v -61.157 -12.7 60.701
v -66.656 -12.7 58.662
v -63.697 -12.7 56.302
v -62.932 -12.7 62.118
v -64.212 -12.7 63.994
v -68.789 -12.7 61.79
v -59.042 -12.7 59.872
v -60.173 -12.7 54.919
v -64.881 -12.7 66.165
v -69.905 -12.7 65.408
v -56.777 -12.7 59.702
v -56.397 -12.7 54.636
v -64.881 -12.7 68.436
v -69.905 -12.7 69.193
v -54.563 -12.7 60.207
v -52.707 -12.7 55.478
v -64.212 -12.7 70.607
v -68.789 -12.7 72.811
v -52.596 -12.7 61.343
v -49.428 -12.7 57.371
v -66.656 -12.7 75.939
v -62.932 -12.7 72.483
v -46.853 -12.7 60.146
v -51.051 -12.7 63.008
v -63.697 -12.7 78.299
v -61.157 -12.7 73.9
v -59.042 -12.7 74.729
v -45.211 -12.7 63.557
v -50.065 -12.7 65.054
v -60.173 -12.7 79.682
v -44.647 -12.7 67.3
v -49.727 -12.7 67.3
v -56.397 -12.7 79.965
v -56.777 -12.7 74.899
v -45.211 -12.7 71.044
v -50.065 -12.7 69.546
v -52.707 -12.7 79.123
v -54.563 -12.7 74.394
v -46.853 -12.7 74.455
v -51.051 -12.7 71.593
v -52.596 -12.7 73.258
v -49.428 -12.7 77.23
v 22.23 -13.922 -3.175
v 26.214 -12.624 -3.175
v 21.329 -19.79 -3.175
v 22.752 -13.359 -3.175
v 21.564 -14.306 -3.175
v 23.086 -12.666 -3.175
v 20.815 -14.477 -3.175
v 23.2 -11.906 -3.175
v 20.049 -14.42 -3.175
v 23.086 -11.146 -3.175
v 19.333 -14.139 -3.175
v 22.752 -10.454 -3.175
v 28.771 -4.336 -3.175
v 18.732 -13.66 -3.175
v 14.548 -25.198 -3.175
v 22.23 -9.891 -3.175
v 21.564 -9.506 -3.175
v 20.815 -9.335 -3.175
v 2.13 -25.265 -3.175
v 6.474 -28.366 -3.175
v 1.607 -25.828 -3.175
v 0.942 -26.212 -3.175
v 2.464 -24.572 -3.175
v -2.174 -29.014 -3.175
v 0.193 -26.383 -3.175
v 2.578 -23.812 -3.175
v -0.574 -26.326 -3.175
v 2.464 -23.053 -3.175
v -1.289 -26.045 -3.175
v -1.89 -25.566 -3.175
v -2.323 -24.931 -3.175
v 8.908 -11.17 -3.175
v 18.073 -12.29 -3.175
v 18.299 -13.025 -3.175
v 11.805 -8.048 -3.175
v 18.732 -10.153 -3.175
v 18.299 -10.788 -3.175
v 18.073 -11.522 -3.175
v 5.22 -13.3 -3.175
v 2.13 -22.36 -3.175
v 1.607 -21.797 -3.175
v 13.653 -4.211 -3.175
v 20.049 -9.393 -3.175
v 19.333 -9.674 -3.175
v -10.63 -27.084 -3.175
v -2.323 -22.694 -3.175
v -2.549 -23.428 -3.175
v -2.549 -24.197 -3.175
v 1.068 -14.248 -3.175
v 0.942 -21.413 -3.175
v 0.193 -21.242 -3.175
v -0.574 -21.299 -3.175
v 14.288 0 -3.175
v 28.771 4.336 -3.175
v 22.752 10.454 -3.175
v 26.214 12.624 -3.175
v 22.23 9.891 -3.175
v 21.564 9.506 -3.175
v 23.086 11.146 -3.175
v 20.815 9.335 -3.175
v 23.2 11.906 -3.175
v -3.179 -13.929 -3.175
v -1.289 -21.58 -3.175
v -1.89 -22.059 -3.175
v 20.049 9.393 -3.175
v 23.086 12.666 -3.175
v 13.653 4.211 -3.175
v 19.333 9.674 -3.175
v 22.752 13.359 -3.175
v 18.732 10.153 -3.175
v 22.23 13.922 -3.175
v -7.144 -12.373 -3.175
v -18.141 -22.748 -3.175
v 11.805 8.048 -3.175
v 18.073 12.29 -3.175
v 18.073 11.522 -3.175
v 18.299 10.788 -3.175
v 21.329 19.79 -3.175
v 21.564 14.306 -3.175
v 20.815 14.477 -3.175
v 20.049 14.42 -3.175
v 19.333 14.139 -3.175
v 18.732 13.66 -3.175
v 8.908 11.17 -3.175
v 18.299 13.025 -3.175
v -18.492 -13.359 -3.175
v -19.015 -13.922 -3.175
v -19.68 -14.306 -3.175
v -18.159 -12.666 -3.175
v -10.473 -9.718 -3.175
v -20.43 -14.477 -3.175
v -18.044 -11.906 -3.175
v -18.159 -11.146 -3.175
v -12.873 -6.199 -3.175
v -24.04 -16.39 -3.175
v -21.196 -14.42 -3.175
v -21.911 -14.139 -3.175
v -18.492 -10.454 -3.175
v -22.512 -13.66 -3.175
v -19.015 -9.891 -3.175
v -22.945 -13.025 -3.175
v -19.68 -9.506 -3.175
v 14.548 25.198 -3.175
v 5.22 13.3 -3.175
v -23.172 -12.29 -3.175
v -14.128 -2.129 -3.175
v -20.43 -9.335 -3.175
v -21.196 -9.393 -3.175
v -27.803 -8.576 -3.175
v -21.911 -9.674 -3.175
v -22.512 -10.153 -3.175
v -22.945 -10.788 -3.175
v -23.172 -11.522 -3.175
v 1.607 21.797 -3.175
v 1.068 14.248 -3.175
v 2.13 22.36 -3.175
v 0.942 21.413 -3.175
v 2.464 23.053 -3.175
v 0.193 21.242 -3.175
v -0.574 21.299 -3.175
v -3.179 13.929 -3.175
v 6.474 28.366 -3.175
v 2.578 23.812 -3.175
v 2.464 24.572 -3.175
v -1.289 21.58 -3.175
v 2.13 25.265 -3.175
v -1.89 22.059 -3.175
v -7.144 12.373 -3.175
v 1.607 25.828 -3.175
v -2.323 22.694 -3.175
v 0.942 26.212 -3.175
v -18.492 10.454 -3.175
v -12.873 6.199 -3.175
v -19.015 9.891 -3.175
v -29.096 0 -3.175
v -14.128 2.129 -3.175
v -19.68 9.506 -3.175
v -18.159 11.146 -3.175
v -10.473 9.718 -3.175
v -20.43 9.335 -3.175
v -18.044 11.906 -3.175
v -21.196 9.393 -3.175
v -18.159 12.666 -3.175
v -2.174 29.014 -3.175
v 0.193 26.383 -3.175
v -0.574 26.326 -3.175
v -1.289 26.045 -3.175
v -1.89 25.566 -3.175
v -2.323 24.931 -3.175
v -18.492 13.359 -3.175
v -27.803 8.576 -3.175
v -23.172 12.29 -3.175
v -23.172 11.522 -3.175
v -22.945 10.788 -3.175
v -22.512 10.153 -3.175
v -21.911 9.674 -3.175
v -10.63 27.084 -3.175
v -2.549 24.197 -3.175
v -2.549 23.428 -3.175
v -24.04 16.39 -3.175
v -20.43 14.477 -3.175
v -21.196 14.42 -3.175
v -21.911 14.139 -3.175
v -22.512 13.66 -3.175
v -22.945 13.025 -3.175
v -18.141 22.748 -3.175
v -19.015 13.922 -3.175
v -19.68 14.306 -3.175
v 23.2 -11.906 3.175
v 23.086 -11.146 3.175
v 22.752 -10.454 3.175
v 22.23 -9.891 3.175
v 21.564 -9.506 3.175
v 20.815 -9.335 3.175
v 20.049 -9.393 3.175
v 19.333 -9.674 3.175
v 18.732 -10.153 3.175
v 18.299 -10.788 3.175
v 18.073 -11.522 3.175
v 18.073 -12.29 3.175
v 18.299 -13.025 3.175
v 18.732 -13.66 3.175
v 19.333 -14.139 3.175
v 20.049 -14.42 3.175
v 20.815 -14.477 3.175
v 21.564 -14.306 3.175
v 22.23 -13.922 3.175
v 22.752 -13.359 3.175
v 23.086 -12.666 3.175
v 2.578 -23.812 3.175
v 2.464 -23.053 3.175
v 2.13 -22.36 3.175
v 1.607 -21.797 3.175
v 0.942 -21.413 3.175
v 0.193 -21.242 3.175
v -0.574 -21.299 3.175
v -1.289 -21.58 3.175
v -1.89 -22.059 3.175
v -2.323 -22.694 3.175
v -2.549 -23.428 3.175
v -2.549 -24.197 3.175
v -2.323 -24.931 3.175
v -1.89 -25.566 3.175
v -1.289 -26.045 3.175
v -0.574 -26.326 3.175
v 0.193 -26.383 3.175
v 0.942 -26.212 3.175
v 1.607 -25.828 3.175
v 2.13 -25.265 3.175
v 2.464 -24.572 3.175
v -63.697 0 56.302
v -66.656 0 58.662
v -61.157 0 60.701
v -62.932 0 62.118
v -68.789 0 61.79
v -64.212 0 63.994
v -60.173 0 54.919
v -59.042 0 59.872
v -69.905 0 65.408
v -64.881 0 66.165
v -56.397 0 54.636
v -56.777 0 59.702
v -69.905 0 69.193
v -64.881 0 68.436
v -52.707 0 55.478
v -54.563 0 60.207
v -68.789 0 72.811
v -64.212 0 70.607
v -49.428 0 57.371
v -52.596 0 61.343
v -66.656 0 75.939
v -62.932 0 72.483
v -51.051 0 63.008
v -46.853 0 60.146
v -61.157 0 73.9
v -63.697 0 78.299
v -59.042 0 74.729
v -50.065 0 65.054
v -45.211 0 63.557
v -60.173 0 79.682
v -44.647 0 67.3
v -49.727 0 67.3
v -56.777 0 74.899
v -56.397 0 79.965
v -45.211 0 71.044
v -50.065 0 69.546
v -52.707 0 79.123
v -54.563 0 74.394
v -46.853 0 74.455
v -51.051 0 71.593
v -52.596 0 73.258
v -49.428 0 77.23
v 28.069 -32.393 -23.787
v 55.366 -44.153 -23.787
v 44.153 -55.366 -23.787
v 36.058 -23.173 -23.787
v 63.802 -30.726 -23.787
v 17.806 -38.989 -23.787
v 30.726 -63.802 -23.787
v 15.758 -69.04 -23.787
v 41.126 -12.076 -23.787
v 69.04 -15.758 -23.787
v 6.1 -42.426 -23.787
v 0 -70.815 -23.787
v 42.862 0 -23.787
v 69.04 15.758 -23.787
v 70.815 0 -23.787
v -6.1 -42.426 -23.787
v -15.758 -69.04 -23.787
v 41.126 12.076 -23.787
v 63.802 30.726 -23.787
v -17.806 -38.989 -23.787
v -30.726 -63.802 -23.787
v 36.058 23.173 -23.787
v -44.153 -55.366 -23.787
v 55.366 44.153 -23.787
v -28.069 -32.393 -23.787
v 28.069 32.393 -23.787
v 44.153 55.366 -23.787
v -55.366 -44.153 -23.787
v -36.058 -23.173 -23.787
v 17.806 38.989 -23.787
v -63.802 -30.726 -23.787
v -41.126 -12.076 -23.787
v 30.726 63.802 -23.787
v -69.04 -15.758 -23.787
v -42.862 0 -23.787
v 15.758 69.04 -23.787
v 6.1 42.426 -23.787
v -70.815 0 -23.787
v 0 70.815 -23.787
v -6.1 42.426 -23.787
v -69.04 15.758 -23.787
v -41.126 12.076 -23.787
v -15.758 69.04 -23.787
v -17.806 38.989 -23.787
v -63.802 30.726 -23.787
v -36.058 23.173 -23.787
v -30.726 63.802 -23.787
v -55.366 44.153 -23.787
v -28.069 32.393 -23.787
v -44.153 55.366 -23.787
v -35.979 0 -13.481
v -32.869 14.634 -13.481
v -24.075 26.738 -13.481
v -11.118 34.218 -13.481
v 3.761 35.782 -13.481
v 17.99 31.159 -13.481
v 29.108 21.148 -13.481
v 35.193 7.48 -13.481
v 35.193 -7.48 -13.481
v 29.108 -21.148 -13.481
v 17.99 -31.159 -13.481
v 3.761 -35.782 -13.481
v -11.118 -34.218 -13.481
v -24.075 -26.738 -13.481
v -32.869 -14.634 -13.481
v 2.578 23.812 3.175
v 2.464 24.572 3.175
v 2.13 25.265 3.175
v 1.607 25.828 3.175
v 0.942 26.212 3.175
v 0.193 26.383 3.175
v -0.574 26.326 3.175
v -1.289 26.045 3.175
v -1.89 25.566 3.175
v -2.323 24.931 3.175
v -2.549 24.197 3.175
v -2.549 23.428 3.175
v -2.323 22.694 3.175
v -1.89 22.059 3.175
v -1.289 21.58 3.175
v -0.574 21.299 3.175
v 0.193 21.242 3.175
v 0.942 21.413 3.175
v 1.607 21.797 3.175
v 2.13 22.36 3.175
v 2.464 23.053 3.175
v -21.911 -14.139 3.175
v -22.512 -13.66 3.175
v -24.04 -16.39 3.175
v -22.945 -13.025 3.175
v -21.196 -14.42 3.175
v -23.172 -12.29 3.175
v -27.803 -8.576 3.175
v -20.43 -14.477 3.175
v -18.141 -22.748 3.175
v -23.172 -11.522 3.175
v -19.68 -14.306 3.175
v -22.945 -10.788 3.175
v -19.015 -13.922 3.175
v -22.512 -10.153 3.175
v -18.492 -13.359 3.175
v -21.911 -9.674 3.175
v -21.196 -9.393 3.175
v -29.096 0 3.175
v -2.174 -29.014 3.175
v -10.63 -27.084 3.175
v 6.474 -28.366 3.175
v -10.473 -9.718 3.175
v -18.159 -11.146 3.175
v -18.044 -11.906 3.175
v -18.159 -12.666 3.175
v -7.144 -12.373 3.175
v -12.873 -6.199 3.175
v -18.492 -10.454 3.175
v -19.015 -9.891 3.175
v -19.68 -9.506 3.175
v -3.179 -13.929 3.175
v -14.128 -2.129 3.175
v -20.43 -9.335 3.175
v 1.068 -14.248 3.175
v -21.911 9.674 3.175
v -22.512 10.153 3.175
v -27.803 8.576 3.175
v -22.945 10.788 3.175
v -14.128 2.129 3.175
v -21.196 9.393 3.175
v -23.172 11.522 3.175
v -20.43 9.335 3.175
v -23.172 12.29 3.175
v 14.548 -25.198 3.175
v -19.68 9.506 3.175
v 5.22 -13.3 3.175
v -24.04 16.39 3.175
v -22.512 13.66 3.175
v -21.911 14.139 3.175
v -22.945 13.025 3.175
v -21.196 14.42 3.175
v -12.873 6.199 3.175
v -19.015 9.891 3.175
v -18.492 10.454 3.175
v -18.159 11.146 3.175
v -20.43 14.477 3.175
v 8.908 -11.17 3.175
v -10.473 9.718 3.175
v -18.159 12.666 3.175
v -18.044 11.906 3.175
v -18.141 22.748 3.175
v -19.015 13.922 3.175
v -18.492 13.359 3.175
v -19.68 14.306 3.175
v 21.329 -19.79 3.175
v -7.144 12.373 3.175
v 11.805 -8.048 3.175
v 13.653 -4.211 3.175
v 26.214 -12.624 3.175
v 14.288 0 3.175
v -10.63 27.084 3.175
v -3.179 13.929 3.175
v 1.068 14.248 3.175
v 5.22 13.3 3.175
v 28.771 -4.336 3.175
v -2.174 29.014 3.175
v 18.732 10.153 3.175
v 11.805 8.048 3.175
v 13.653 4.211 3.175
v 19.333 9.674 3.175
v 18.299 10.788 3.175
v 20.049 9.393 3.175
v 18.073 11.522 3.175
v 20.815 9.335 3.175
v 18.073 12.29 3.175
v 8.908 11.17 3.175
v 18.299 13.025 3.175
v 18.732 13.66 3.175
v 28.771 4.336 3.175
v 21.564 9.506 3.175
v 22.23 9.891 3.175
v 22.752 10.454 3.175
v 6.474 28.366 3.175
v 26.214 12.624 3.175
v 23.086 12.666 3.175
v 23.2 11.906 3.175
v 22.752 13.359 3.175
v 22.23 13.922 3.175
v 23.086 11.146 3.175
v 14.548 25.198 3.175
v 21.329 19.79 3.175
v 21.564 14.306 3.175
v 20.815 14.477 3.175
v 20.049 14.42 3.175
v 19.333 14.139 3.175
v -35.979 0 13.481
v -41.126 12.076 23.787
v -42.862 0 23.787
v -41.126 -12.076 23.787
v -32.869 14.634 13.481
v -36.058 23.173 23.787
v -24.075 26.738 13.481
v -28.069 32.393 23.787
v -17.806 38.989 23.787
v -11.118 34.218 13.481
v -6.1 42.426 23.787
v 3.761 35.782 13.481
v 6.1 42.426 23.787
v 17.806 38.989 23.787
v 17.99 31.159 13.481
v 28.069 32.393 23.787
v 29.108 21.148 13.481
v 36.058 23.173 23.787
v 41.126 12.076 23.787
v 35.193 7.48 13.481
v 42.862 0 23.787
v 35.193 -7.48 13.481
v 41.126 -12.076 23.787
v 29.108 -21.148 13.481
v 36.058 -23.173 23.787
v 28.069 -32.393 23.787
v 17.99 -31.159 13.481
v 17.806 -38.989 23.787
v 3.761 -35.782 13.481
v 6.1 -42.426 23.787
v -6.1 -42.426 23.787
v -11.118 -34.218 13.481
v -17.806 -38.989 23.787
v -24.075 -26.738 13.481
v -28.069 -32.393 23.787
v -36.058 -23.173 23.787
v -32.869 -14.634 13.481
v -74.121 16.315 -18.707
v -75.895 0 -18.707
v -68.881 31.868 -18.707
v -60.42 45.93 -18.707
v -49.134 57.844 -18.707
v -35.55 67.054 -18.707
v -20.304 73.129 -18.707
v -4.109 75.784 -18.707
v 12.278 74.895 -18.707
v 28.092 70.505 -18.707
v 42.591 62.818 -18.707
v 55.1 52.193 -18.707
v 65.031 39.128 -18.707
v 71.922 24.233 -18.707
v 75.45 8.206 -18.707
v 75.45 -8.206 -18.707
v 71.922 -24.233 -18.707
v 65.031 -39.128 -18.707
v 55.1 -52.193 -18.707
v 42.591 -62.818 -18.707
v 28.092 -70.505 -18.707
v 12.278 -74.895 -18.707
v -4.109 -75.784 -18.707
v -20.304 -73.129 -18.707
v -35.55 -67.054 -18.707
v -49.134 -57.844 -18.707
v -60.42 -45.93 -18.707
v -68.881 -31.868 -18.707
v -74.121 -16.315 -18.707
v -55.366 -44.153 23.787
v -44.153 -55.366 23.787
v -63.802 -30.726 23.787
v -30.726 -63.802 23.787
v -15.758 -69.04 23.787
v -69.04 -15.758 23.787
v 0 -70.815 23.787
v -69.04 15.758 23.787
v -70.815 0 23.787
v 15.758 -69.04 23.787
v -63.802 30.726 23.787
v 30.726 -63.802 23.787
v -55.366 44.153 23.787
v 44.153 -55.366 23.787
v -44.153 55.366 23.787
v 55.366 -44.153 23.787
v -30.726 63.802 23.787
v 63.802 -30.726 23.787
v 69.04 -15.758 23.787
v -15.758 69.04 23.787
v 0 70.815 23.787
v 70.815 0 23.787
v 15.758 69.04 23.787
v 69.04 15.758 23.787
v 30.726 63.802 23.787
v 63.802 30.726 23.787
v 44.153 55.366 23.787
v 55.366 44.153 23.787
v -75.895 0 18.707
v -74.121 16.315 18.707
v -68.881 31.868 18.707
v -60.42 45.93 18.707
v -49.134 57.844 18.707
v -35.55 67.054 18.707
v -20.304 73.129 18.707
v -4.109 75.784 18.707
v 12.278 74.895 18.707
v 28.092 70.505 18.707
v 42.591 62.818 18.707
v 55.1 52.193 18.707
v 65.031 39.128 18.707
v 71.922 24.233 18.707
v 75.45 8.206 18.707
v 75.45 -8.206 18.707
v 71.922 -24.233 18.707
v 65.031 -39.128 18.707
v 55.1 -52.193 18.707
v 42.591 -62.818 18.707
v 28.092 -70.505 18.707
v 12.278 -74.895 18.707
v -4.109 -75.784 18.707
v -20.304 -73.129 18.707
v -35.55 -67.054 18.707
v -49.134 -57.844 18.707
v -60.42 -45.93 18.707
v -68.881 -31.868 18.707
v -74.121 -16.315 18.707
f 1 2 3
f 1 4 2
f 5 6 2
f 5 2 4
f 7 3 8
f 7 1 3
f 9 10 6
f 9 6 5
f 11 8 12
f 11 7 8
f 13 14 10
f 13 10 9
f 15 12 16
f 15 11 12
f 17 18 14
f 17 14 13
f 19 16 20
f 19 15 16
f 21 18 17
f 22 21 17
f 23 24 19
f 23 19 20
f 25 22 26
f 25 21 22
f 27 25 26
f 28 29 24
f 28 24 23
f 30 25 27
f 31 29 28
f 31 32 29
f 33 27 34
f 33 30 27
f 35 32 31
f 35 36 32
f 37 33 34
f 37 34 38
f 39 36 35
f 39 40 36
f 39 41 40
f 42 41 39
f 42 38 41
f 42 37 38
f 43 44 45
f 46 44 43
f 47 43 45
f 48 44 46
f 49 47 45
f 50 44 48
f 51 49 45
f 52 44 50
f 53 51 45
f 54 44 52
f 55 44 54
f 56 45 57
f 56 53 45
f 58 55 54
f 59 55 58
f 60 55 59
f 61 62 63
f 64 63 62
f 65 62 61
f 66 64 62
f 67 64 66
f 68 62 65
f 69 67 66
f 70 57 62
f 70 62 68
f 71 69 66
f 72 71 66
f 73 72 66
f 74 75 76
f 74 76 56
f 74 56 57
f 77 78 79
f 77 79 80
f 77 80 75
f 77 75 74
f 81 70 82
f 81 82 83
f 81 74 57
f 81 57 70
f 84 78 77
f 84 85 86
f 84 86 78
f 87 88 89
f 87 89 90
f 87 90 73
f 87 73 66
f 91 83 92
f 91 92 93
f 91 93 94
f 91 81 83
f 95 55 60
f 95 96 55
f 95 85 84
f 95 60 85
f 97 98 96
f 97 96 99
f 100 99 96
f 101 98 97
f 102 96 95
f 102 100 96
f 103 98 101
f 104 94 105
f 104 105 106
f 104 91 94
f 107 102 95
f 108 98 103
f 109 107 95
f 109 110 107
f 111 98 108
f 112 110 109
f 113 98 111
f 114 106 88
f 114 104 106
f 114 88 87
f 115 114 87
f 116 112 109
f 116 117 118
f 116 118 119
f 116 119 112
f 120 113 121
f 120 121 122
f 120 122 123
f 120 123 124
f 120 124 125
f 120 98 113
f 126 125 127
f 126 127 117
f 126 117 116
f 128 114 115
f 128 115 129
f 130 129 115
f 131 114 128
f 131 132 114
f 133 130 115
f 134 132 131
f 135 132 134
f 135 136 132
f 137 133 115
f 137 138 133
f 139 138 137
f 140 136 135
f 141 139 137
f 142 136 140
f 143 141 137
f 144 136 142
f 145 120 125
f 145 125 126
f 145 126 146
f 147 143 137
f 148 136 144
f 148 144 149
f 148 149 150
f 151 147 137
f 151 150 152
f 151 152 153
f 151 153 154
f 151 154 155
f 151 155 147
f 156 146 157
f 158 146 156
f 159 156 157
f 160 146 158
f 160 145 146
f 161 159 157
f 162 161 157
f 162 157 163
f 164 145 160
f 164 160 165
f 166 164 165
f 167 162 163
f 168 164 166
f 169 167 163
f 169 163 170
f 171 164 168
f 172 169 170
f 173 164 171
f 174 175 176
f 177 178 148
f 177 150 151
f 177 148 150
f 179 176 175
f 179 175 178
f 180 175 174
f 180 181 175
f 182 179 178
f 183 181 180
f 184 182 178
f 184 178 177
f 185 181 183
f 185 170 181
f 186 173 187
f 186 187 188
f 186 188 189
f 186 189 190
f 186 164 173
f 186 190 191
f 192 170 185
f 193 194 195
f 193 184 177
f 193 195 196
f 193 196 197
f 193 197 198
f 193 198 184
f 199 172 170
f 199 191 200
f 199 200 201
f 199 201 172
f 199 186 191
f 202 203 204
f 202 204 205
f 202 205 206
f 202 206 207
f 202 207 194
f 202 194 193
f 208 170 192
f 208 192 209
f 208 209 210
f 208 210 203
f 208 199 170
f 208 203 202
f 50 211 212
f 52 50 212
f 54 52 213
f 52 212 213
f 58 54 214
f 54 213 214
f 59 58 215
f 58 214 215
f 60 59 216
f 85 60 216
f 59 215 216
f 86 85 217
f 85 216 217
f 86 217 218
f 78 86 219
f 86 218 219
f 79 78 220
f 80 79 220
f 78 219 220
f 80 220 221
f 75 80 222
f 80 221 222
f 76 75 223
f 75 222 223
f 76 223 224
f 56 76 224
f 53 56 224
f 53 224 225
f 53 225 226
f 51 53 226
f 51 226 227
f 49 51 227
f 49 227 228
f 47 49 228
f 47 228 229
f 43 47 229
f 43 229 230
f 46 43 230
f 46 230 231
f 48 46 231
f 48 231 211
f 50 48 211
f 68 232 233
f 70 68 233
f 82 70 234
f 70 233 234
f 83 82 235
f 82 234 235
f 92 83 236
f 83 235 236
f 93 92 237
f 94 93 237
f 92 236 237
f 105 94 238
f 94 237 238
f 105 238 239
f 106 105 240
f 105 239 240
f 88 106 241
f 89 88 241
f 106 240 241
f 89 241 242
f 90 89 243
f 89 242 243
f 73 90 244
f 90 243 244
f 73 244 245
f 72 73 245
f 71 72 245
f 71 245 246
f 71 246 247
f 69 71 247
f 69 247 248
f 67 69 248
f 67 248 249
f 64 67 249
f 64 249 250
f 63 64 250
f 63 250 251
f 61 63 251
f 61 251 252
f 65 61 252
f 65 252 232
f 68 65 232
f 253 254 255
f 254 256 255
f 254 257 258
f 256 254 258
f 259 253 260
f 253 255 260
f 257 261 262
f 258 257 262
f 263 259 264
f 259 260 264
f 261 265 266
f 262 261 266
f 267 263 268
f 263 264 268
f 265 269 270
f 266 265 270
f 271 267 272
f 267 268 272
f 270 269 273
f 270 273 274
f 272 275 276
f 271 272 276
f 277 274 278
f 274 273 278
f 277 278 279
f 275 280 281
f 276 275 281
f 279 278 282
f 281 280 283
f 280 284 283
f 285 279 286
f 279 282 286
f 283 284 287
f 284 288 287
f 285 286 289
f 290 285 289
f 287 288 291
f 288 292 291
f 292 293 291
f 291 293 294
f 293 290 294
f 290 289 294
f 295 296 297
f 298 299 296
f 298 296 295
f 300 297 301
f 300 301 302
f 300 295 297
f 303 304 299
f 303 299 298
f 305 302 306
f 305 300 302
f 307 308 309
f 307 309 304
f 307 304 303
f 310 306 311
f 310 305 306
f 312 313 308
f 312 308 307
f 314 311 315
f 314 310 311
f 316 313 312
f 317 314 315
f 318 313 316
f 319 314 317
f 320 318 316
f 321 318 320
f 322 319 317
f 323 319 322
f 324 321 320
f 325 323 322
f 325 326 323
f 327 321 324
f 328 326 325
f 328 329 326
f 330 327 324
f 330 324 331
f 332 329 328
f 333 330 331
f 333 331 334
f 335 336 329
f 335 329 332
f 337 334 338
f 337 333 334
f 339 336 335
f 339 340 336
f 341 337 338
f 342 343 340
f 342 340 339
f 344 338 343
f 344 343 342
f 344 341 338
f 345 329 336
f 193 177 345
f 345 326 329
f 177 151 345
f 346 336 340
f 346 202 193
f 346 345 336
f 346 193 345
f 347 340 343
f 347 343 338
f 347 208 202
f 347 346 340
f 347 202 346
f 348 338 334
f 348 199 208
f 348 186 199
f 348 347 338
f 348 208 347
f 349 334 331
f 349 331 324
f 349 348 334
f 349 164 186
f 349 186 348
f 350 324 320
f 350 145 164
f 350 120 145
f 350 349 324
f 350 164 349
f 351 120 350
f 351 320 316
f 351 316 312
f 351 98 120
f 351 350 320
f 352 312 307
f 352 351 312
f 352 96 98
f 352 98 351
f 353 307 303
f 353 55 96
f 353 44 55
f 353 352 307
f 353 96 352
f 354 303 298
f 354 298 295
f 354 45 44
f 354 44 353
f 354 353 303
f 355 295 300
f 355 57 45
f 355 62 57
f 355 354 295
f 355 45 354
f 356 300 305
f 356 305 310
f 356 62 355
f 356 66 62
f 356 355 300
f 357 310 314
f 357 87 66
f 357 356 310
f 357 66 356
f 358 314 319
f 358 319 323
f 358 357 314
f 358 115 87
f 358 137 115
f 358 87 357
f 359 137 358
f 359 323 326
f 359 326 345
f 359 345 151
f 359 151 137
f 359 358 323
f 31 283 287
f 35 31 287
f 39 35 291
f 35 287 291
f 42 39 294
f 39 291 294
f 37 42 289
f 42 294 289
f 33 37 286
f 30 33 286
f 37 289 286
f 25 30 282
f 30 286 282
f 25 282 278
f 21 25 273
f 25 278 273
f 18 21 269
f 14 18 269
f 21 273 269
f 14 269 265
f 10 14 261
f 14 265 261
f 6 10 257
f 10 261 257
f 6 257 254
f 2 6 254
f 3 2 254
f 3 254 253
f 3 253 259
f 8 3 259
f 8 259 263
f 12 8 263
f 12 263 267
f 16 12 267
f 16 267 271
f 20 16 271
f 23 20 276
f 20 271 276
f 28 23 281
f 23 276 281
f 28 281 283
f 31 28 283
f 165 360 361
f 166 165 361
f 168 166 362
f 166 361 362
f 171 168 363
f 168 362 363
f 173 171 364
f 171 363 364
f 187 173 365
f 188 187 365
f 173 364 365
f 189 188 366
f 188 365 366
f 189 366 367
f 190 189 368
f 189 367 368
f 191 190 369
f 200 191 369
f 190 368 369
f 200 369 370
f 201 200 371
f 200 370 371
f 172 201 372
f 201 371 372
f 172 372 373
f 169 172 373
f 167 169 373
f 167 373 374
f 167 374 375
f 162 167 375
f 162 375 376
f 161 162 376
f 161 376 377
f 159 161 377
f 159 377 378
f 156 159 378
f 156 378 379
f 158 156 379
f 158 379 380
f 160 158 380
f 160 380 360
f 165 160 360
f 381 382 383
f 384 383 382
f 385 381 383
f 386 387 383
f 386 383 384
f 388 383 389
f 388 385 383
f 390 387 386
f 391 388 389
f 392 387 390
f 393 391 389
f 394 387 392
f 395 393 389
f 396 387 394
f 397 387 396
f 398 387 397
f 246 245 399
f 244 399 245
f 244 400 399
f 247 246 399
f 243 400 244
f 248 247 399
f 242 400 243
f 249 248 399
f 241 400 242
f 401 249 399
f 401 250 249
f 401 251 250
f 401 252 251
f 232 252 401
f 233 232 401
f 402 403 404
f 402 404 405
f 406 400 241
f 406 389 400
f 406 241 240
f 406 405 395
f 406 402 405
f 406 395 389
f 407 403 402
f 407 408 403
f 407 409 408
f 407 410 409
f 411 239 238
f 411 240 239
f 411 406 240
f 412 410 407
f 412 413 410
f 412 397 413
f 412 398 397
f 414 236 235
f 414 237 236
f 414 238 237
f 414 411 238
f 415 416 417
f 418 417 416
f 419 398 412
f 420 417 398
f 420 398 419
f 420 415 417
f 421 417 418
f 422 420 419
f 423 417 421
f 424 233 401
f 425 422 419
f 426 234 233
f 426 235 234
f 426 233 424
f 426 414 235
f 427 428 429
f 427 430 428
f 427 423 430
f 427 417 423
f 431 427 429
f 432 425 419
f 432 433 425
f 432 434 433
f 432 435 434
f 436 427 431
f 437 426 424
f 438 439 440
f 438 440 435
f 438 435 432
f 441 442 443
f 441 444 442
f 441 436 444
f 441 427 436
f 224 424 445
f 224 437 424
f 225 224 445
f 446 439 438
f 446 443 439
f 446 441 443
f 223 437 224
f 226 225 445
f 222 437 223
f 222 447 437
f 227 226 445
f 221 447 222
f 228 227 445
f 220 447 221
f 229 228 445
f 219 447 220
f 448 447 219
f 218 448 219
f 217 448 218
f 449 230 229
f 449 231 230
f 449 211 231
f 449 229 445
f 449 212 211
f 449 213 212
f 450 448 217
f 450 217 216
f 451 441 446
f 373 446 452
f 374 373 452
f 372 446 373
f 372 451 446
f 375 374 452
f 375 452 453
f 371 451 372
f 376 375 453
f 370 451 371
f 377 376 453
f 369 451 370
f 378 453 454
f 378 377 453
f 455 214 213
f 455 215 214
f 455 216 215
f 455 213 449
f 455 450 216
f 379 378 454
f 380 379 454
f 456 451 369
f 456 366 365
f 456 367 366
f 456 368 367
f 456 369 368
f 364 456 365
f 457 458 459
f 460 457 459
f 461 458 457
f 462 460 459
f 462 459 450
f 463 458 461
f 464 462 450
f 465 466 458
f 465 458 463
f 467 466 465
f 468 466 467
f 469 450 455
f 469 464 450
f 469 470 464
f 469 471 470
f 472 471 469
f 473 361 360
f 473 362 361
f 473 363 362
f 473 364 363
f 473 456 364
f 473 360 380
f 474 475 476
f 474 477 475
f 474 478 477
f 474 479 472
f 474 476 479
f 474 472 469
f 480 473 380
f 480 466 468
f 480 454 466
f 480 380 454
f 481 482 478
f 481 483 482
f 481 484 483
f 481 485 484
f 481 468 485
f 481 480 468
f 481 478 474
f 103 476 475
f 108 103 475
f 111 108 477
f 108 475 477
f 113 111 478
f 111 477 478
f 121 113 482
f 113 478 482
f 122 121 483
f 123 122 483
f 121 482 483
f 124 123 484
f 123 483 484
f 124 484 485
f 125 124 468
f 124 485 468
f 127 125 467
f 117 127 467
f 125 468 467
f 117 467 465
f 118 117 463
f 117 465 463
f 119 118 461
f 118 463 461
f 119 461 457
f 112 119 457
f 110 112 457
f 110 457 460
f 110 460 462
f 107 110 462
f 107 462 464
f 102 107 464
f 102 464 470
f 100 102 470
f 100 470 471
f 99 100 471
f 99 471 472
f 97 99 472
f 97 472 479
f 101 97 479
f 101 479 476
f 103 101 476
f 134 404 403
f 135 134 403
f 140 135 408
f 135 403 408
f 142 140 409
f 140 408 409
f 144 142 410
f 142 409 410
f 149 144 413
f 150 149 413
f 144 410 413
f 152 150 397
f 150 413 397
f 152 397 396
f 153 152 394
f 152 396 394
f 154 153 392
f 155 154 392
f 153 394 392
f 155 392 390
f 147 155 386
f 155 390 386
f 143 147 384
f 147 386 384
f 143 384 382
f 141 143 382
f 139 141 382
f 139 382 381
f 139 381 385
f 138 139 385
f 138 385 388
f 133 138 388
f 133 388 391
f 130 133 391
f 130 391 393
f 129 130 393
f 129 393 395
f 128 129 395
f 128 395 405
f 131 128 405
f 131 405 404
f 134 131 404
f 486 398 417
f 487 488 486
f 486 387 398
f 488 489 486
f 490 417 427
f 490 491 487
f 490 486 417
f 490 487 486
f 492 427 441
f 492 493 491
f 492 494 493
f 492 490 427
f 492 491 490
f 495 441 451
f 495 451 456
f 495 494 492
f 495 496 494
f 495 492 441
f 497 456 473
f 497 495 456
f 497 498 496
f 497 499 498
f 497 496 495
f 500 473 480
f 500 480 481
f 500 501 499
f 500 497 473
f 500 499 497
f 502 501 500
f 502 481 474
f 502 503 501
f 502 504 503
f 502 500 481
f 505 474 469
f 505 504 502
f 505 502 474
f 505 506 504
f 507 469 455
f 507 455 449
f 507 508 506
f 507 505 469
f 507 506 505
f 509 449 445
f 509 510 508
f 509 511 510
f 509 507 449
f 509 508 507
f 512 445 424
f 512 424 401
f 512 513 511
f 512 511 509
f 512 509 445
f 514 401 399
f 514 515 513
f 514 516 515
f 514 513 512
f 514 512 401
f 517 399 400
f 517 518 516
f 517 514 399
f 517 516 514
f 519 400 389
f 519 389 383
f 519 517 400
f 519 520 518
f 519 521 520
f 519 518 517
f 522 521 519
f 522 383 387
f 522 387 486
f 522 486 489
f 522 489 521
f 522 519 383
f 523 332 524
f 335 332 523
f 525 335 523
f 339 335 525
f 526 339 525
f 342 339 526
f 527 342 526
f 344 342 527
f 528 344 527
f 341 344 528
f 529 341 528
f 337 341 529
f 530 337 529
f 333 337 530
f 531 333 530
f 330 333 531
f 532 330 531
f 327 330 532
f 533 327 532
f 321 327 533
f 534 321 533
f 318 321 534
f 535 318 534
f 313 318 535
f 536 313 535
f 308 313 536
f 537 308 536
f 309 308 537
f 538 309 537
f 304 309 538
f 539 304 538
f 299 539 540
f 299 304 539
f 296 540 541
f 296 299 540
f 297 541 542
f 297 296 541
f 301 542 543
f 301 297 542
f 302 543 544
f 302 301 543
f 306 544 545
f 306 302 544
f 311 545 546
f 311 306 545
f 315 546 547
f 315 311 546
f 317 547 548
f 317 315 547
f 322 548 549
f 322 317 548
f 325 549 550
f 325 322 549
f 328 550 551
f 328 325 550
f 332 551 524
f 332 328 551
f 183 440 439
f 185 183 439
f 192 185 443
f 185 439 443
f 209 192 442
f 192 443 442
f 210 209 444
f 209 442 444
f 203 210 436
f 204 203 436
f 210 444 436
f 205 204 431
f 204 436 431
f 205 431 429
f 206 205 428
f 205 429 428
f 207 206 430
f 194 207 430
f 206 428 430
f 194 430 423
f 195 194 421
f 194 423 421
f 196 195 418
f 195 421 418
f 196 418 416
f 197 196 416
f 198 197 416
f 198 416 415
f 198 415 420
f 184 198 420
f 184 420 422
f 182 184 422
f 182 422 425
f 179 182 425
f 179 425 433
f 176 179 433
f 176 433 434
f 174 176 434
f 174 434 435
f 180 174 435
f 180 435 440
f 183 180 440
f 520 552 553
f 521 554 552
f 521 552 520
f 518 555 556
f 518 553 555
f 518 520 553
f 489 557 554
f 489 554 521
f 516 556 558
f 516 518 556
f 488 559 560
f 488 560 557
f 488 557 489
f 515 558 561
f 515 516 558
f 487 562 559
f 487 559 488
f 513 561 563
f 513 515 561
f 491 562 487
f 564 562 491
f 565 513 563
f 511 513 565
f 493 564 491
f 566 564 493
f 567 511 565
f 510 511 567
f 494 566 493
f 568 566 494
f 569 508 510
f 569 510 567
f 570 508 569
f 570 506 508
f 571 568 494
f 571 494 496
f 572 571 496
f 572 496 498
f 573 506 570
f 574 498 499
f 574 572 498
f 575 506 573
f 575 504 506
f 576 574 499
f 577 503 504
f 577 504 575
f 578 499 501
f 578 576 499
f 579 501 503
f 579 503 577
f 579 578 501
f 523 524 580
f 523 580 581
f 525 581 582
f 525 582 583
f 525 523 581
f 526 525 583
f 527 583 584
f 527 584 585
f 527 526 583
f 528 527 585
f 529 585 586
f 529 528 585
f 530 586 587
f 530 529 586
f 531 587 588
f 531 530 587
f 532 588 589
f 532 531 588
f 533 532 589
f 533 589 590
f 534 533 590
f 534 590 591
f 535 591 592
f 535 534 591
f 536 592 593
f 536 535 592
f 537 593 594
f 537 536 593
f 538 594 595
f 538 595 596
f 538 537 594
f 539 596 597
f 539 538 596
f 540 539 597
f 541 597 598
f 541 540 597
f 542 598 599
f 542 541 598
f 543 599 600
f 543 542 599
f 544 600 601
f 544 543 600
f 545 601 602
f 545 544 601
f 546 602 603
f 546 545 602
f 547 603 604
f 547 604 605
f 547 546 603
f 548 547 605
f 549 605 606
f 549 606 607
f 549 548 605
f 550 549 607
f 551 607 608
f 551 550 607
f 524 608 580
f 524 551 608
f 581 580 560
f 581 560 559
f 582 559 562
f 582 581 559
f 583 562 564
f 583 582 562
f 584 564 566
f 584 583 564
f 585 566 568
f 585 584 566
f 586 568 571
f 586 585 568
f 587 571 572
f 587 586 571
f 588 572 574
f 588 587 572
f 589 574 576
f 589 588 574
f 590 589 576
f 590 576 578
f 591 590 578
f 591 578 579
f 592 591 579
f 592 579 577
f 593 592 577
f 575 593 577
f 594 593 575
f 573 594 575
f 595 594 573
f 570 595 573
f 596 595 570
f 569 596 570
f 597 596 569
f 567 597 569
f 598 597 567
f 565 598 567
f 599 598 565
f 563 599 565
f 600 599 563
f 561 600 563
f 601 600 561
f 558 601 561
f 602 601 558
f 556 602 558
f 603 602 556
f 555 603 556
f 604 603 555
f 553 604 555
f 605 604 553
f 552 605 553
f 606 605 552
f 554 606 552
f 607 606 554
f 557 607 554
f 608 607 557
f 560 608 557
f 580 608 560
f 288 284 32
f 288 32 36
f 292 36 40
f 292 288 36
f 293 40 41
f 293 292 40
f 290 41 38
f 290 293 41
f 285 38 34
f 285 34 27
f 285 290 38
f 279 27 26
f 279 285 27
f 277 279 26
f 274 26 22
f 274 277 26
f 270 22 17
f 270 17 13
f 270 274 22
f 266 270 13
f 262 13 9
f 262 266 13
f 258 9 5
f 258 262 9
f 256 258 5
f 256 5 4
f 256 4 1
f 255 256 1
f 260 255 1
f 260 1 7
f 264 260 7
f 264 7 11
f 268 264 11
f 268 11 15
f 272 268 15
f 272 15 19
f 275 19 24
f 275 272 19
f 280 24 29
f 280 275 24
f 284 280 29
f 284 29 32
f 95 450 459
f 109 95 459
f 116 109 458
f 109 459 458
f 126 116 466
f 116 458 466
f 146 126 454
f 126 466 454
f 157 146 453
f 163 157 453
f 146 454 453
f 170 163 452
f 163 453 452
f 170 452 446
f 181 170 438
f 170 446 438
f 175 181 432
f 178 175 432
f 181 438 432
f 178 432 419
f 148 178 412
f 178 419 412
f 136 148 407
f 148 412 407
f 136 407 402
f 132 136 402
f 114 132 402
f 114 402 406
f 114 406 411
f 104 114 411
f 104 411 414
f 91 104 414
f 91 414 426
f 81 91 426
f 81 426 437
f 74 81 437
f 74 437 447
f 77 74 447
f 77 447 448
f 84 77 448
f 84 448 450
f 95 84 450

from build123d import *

# Parameters (mm, degrees)
F2_R     = 2.5781
F2_R_2   = 14.2875
F3_DEPTH = 26.9631
F4_SIZE  = 5.08
F5_R     = 12.7
F5_R_2   = 7.62
F6_DEPTH = 12.7


with BuildPart() as f1:
    # F0 (on Front) → F1 (revolve)
    with BuildSketch(Plane.XZ):
        Polygon((-42.8625, 23.7871), (-75.8952, 23.7871), (-75.8952, -23.7871), (-42.8625, -23.7871), (-29.0957, -3.175), (0, -3.175), (0, 3.175), (-29.0957, 3.175), align=None)
    revolve(axis=Axis((0, 0, 0), (0, 0, -1)))

    # F2 (on face) → F3 (cut, through all)
    with BuildSketch(Plane.XY.offset(3.175)):
        with Locations((-20.62223, 11.90625)):
            Circle(F2_R)
        with Locations((-20.62223, -11.90625)):
            Circle(F2_R)
        Circle(F2_R_2)
        with Locations((20.62223, 11.90625)):
            Circle(F2_R)
        with Locations((0, 23.8125)):
            Circle(F2_R)
        with Locations((0, -23.8125)):
            Circle(F2_R)
        with Locations((20.62223, -11.90625)):
            Circle(F2_R)
    extrude(amount=-F3_DEPTH, mode=Mode.SUBTRACT)

    # F4
    f4_edges = [f1.edges().sort_by_distance(p)[0] for p in [
        (75.8952, 0, 23.7871),
        (75.8952, 0, -23.7871),
    ]]
    chamfer(f4_edges, length=F4_SIZE)


with BuildPart() as f6:
    # F5 (on Front) → F6 (new body)
    with BuildSketch(Plane.XZ):
        with Locations((-57.346523, 67.300461)):
            Circle(F5_R)
        with Locations((-57.346523, 67.300461)):
            Circle(F5_R_2, mode=Mode.SUBTRACT)
    extrude(amount=F6_DEPTH)


solid = Compound([f1.part, f6.part])
